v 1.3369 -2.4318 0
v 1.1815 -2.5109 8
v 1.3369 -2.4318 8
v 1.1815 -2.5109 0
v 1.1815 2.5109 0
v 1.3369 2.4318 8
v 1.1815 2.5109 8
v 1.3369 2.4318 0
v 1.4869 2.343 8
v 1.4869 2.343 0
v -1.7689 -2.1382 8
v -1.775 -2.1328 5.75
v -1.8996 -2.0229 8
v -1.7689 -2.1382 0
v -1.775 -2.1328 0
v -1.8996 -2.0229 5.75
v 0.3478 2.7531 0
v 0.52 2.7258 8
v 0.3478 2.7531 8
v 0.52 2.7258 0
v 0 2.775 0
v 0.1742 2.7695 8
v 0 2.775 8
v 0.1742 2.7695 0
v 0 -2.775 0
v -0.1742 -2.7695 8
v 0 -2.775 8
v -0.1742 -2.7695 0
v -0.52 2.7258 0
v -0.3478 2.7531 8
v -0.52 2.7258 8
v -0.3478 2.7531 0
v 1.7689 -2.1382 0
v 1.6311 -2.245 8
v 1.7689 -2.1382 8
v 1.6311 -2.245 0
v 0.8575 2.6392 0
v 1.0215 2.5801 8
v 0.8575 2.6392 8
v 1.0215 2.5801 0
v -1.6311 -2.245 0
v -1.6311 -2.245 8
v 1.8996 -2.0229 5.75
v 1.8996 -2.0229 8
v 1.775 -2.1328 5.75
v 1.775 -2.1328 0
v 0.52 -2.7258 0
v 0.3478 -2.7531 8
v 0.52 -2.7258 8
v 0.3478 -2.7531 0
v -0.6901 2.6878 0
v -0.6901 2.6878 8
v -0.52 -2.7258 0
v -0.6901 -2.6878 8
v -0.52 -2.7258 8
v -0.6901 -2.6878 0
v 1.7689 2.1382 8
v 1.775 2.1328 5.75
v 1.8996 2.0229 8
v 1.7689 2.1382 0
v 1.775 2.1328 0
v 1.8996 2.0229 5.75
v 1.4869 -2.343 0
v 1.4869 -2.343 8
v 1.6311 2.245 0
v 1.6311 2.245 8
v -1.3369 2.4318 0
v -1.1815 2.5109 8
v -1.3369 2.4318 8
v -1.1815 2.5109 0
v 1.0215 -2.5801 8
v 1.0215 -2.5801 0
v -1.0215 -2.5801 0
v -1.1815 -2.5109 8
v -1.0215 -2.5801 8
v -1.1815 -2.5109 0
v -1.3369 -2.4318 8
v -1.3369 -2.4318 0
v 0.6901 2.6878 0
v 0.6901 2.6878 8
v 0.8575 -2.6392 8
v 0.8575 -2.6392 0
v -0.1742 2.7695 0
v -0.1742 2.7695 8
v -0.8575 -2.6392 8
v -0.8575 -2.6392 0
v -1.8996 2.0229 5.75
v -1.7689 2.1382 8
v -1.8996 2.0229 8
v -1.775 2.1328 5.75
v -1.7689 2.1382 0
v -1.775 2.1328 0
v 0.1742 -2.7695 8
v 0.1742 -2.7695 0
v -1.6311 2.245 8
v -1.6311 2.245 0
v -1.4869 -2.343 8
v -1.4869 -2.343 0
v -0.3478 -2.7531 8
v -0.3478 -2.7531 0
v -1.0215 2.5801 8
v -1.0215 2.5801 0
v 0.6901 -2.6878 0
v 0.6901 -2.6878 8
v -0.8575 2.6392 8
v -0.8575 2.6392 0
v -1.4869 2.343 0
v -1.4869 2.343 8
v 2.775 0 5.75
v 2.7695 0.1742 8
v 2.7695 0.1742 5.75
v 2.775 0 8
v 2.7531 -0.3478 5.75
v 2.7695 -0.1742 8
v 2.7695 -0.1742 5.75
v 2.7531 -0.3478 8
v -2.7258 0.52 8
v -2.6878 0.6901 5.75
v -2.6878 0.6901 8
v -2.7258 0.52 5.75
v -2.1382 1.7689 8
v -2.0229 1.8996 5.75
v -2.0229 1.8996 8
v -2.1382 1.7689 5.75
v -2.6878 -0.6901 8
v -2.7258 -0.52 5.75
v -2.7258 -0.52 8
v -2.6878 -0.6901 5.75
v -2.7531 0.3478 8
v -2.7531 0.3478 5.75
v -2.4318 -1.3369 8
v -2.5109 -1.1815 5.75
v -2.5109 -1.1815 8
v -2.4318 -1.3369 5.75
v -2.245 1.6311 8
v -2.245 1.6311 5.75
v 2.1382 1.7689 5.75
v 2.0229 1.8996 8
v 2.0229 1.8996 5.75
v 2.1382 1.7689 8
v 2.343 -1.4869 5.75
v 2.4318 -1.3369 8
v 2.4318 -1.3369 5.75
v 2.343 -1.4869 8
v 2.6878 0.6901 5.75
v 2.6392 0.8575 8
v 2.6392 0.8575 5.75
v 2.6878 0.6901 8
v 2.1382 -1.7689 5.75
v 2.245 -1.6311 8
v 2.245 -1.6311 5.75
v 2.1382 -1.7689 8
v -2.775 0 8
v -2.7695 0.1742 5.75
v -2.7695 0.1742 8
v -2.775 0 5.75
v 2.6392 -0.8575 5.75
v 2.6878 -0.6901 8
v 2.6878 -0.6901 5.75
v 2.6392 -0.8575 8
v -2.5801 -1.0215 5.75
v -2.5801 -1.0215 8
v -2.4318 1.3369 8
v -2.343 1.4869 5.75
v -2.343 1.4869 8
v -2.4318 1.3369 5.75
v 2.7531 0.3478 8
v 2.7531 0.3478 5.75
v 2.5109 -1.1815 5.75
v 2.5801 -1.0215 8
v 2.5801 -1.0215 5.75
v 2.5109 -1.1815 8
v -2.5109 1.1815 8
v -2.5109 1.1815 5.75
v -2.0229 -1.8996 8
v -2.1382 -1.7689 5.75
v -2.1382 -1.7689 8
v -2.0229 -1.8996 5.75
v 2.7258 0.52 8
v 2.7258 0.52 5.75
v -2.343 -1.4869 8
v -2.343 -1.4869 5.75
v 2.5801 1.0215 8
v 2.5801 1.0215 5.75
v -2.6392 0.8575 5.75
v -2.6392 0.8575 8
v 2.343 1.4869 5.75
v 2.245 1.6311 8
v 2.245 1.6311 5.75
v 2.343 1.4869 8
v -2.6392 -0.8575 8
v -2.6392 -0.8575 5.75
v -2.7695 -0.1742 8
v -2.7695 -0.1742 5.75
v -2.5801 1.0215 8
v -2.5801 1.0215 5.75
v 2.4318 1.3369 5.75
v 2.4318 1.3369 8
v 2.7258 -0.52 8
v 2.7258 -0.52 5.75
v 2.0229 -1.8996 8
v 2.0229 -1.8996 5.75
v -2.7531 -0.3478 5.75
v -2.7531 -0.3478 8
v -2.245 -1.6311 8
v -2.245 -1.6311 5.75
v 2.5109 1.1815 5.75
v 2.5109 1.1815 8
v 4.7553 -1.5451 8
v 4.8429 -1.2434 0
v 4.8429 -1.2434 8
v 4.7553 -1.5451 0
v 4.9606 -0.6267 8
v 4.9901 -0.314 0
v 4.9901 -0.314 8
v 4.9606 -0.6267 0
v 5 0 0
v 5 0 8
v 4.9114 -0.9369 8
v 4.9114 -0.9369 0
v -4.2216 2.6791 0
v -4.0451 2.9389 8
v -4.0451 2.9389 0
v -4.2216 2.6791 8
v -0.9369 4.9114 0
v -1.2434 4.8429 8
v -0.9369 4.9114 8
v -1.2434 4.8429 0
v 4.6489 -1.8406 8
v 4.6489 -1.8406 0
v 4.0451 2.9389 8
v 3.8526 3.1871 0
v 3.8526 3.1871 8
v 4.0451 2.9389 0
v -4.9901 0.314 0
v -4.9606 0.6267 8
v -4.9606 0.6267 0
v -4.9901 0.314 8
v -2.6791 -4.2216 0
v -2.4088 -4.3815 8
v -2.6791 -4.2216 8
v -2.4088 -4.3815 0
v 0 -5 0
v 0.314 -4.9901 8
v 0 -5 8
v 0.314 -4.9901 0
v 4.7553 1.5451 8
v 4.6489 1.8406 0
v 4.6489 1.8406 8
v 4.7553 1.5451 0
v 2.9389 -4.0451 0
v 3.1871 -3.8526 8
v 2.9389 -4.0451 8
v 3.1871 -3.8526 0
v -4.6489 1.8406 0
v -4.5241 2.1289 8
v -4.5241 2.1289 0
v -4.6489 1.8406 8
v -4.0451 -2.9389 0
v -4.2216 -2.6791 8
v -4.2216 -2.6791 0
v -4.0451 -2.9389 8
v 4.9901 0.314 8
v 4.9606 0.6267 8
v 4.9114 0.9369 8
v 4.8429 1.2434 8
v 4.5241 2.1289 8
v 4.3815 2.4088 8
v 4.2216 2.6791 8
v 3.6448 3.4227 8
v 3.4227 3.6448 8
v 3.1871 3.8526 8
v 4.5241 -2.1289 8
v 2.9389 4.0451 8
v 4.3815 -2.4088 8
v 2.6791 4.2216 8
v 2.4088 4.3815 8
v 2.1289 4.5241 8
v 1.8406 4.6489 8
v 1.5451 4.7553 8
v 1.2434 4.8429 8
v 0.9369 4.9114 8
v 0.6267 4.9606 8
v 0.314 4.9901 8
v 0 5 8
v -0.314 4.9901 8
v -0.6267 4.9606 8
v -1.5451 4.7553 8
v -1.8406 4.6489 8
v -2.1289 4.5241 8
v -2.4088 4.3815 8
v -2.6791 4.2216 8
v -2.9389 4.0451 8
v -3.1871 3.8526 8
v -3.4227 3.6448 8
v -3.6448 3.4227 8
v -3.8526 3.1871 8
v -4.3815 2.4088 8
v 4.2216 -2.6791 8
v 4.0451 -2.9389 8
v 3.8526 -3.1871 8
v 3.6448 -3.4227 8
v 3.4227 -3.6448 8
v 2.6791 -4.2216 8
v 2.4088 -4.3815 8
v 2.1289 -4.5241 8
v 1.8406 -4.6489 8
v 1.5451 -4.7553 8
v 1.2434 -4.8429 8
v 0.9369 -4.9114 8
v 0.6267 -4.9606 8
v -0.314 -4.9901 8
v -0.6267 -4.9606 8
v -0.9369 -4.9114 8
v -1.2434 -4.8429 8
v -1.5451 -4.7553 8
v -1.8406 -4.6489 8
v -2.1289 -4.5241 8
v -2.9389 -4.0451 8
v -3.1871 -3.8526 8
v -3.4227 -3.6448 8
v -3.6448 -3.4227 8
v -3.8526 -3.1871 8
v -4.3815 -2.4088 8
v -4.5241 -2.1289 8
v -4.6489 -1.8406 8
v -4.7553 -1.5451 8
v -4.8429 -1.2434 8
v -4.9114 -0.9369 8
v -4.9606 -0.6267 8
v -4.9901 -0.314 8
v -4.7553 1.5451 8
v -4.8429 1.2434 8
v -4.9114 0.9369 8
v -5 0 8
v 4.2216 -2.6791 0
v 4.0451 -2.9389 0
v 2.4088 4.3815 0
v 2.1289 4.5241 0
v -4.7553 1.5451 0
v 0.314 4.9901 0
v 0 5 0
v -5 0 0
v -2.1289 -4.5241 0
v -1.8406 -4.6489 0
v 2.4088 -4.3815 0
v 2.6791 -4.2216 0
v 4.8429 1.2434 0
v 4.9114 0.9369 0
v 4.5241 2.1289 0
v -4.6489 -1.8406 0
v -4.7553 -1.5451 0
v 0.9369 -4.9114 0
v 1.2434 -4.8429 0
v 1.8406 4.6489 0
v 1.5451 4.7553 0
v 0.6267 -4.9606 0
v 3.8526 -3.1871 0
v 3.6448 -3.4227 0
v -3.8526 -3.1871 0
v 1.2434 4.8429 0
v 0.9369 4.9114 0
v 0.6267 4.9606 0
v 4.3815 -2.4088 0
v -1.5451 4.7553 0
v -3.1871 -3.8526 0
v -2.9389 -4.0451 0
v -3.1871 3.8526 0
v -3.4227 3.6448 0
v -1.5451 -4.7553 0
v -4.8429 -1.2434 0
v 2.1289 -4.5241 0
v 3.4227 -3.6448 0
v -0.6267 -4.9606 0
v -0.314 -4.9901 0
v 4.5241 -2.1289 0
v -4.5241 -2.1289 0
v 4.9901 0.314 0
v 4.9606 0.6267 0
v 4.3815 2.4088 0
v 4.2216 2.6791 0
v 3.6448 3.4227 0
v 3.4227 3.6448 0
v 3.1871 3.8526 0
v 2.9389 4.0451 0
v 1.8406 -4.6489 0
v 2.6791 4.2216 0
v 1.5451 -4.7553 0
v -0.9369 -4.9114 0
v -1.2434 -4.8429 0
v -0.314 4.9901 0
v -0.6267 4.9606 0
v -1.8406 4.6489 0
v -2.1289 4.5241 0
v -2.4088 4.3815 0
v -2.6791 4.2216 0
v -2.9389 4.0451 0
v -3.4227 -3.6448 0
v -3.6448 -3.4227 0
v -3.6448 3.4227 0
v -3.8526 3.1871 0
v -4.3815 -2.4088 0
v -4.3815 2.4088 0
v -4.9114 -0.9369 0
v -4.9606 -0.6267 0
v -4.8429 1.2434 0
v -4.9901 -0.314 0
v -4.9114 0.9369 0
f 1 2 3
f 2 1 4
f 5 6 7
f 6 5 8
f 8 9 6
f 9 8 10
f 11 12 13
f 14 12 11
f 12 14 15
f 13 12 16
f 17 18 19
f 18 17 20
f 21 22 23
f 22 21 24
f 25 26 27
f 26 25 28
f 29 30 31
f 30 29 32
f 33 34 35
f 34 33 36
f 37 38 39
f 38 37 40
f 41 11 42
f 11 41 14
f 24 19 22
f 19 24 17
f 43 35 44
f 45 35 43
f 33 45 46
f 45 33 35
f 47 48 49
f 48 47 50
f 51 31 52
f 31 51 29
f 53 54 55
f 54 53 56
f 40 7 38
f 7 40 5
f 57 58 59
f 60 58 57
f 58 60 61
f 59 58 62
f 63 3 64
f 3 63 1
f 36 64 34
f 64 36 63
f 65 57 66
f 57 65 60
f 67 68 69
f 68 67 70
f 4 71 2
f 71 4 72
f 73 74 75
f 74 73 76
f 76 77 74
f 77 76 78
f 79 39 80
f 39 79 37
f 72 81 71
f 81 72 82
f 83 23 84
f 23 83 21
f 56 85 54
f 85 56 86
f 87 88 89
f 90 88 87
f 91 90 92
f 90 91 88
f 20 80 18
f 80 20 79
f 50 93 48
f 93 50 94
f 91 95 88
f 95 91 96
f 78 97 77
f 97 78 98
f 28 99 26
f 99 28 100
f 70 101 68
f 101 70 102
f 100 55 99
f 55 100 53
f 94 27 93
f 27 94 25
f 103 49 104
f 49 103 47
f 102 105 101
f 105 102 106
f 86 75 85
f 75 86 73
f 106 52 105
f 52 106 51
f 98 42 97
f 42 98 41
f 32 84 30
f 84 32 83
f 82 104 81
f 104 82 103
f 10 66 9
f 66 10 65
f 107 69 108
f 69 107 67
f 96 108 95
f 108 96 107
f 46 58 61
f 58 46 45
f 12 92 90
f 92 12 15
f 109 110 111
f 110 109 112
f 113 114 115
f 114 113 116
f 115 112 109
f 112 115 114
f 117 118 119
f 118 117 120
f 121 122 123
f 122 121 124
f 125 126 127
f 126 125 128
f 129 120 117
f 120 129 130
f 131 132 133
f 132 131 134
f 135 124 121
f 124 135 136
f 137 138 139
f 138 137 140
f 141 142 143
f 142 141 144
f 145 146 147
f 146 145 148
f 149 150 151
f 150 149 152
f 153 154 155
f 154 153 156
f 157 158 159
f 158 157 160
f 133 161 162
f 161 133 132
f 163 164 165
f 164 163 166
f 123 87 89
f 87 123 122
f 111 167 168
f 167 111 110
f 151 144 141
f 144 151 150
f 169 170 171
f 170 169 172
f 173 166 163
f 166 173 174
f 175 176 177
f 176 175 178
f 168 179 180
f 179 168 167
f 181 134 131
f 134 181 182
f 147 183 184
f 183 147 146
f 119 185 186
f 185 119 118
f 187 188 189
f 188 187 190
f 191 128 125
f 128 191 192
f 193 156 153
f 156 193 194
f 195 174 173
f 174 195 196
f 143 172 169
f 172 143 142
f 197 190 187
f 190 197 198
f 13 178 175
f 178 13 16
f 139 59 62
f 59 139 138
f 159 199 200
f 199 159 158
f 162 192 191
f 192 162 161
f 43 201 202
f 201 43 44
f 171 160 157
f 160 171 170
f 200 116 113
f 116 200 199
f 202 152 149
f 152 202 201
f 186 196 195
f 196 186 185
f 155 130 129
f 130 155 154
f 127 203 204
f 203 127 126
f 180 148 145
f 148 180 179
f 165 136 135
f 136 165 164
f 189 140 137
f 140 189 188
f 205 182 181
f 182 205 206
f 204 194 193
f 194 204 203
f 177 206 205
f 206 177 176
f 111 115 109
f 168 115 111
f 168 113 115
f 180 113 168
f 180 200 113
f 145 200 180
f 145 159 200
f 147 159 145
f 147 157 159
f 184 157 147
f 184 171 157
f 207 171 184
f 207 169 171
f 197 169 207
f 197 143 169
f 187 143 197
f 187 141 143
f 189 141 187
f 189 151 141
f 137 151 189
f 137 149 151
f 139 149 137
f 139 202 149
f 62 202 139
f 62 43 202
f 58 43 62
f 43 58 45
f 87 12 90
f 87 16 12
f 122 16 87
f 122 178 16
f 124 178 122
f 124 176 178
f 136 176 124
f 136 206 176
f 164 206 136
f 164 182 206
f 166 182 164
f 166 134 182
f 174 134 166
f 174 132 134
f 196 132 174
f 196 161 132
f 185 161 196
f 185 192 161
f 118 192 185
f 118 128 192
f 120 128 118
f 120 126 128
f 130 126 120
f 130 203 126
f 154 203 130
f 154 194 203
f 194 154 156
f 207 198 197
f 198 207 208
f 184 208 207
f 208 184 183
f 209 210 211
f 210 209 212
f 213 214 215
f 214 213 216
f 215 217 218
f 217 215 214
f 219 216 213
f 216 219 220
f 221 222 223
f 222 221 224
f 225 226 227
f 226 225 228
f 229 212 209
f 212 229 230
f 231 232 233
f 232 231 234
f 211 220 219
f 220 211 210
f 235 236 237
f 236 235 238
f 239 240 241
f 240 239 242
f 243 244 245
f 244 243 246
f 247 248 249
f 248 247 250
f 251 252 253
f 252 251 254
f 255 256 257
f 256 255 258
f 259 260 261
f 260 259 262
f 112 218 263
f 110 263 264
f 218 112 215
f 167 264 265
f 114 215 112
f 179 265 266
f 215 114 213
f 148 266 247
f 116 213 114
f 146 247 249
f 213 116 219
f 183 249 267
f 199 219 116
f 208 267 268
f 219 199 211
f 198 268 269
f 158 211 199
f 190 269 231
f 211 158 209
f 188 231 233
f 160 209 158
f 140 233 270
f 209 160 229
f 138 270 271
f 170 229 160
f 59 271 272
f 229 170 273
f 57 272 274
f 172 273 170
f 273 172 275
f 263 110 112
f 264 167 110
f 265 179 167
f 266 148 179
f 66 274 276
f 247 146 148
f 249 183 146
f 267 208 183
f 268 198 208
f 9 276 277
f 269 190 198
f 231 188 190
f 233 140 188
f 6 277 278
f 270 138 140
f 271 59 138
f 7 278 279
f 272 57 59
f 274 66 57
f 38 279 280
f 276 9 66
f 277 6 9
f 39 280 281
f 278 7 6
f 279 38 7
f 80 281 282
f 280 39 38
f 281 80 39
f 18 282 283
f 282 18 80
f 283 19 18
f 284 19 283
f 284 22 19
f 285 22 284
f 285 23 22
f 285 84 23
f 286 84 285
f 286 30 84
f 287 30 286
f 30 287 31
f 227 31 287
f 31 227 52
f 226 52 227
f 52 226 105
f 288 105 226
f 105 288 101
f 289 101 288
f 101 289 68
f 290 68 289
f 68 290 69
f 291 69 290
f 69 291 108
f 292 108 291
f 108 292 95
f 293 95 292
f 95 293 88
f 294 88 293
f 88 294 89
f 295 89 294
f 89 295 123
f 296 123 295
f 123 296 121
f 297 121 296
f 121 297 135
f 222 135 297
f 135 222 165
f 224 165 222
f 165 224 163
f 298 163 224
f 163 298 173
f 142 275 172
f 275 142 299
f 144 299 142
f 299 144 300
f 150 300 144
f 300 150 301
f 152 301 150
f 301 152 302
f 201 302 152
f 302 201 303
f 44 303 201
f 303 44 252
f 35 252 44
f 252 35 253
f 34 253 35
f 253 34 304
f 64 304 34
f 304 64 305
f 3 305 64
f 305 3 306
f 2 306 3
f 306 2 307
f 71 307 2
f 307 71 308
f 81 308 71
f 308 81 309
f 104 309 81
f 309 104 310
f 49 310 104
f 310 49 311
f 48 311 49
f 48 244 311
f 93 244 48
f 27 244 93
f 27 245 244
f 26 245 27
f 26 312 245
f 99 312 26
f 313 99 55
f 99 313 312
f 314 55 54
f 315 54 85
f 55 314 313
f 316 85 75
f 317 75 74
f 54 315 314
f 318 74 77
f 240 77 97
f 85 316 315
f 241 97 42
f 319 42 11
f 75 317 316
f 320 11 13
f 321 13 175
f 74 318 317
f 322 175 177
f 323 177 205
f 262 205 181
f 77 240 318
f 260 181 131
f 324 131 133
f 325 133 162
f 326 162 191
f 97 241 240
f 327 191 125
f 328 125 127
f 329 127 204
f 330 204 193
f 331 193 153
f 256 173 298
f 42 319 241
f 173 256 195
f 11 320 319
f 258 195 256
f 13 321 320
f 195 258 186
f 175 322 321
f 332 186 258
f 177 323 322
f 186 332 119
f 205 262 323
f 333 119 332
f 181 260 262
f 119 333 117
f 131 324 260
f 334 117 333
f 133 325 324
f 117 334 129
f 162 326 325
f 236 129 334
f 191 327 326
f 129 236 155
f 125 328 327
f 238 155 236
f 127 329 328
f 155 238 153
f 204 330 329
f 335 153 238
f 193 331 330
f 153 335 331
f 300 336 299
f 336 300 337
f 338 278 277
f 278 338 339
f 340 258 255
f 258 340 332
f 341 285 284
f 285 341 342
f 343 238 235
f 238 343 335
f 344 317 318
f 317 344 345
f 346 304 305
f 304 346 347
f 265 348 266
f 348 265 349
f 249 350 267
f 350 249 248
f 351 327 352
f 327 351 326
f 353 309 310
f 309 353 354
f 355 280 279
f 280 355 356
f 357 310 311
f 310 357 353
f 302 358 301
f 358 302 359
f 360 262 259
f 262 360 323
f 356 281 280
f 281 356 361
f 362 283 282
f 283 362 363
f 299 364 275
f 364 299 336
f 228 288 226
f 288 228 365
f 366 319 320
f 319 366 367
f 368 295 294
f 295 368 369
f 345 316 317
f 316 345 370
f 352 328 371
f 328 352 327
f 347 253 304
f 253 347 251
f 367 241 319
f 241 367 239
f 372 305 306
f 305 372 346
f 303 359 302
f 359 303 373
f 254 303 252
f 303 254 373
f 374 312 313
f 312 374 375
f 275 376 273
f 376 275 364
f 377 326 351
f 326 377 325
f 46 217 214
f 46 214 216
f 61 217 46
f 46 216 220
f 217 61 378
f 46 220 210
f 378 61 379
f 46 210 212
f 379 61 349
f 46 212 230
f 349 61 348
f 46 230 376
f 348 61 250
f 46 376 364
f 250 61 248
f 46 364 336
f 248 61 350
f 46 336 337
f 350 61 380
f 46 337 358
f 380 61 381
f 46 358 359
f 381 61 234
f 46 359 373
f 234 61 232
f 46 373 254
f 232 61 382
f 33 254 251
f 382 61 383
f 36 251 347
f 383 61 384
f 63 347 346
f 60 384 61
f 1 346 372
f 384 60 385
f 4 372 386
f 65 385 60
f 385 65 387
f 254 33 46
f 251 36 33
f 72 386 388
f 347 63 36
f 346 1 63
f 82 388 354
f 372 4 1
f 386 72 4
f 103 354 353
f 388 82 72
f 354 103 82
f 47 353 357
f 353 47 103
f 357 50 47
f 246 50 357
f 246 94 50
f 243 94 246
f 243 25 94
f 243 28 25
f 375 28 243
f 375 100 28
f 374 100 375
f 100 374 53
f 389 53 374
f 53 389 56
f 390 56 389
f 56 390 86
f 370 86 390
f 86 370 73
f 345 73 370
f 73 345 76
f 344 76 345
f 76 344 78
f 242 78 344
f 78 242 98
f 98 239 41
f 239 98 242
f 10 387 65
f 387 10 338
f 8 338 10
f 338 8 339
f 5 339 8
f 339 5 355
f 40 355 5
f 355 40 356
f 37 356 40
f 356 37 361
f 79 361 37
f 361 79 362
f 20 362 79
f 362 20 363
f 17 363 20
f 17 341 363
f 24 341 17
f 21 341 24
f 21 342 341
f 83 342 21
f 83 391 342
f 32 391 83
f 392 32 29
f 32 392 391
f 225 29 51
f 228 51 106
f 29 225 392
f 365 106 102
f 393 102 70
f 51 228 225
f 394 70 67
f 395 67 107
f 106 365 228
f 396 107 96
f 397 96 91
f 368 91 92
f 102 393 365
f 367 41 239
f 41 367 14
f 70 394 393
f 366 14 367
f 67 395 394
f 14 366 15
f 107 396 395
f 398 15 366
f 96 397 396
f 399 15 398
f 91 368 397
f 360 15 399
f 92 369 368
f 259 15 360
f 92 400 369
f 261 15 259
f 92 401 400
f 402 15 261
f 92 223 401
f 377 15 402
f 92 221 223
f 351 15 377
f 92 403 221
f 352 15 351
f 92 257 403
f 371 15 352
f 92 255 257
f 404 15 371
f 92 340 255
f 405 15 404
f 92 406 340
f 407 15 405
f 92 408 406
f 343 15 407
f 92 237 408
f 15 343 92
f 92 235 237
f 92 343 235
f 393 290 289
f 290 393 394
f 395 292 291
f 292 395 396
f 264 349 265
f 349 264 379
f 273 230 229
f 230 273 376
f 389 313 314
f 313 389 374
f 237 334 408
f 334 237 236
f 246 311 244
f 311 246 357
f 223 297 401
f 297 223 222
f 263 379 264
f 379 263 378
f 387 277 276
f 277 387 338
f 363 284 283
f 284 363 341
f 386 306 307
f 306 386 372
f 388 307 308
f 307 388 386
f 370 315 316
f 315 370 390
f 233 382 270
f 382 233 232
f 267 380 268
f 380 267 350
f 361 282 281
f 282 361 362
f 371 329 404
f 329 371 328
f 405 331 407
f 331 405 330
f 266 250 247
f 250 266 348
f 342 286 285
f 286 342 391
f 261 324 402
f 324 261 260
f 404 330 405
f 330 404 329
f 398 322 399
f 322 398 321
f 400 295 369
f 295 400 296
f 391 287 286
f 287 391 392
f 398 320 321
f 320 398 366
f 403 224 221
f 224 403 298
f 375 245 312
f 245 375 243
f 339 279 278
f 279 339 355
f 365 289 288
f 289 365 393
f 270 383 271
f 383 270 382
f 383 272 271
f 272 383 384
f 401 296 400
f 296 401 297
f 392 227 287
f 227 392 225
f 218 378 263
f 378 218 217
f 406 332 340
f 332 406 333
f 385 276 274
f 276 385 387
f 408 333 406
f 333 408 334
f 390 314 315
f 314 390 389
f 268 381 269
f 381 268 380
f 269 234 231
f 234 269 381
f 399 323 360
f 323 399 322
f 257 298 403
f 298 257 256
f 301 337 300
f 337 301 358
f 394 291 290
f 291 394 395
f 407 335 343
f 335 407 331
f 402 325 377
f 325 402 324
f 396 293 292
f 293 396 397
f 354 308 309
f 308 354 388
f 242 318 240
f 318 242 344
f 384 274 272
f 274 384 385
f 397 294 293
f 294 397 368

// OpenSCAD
/**
 * Coupling to fit on the 28BYJ-48 Stepper motor shaft.
 **/

$fn=100;

couplingOD = 10;    // The outer diameter required for the coupling
couplingH = 8;     // The coupling height
topHoleD = 0;       // If a hole in the coupling top is needed, set the
                    // diameter here. NOTE: This works best if this diameter is
                    // less than the shaft flat bit width or else bridging is
                    // needed when printing - just try it and see what works
                    // best.

// --- Motor shaft measurements -------
shaftD = 4.95;  // Shaft diameter
shaftH = 8.4;   // Shaft height
shaftFlatH = 6.1; // Height of flat bit from top
shaftFlatW = 2.95; // Width of flat area

// The shaft bit
module Shaft() {

    // Some clearance to allow a good fit
    c = 0.6;

    // First the flat bit for the top
    intersection() {
        cylinder(h=shaftH, d=shaftD+c);
        translate([-(shaftFlatW+c)/2, -(shaftD+c)/2, 0])
            cube([shaftFlatW+c, shaftD+c, shaftH]);
    }
    cylinder(d=shaftD+c, h=shaftH-shaftFlatH);
}

module Coupling() {

    // The full coupling, minus the shaft
    difference() {
        cylinder(d=couplingOD, h=couplingH);
        // Hole in the top?
        if (topHoleD>0) {
            translate([0, 0, shaftH-0.06])
            cylinder(h=couplingH, d=topHoleD);
        }
        // Drop it 0.05mm so it cuts through the coupling bottom
        translate([0, 0, -0.05])
            Shaft();
    }
}

// Turn it upside down for better printing.
translate([0, 0, couplingH])
    rotate([180, 0, 0])
        Coupling();
